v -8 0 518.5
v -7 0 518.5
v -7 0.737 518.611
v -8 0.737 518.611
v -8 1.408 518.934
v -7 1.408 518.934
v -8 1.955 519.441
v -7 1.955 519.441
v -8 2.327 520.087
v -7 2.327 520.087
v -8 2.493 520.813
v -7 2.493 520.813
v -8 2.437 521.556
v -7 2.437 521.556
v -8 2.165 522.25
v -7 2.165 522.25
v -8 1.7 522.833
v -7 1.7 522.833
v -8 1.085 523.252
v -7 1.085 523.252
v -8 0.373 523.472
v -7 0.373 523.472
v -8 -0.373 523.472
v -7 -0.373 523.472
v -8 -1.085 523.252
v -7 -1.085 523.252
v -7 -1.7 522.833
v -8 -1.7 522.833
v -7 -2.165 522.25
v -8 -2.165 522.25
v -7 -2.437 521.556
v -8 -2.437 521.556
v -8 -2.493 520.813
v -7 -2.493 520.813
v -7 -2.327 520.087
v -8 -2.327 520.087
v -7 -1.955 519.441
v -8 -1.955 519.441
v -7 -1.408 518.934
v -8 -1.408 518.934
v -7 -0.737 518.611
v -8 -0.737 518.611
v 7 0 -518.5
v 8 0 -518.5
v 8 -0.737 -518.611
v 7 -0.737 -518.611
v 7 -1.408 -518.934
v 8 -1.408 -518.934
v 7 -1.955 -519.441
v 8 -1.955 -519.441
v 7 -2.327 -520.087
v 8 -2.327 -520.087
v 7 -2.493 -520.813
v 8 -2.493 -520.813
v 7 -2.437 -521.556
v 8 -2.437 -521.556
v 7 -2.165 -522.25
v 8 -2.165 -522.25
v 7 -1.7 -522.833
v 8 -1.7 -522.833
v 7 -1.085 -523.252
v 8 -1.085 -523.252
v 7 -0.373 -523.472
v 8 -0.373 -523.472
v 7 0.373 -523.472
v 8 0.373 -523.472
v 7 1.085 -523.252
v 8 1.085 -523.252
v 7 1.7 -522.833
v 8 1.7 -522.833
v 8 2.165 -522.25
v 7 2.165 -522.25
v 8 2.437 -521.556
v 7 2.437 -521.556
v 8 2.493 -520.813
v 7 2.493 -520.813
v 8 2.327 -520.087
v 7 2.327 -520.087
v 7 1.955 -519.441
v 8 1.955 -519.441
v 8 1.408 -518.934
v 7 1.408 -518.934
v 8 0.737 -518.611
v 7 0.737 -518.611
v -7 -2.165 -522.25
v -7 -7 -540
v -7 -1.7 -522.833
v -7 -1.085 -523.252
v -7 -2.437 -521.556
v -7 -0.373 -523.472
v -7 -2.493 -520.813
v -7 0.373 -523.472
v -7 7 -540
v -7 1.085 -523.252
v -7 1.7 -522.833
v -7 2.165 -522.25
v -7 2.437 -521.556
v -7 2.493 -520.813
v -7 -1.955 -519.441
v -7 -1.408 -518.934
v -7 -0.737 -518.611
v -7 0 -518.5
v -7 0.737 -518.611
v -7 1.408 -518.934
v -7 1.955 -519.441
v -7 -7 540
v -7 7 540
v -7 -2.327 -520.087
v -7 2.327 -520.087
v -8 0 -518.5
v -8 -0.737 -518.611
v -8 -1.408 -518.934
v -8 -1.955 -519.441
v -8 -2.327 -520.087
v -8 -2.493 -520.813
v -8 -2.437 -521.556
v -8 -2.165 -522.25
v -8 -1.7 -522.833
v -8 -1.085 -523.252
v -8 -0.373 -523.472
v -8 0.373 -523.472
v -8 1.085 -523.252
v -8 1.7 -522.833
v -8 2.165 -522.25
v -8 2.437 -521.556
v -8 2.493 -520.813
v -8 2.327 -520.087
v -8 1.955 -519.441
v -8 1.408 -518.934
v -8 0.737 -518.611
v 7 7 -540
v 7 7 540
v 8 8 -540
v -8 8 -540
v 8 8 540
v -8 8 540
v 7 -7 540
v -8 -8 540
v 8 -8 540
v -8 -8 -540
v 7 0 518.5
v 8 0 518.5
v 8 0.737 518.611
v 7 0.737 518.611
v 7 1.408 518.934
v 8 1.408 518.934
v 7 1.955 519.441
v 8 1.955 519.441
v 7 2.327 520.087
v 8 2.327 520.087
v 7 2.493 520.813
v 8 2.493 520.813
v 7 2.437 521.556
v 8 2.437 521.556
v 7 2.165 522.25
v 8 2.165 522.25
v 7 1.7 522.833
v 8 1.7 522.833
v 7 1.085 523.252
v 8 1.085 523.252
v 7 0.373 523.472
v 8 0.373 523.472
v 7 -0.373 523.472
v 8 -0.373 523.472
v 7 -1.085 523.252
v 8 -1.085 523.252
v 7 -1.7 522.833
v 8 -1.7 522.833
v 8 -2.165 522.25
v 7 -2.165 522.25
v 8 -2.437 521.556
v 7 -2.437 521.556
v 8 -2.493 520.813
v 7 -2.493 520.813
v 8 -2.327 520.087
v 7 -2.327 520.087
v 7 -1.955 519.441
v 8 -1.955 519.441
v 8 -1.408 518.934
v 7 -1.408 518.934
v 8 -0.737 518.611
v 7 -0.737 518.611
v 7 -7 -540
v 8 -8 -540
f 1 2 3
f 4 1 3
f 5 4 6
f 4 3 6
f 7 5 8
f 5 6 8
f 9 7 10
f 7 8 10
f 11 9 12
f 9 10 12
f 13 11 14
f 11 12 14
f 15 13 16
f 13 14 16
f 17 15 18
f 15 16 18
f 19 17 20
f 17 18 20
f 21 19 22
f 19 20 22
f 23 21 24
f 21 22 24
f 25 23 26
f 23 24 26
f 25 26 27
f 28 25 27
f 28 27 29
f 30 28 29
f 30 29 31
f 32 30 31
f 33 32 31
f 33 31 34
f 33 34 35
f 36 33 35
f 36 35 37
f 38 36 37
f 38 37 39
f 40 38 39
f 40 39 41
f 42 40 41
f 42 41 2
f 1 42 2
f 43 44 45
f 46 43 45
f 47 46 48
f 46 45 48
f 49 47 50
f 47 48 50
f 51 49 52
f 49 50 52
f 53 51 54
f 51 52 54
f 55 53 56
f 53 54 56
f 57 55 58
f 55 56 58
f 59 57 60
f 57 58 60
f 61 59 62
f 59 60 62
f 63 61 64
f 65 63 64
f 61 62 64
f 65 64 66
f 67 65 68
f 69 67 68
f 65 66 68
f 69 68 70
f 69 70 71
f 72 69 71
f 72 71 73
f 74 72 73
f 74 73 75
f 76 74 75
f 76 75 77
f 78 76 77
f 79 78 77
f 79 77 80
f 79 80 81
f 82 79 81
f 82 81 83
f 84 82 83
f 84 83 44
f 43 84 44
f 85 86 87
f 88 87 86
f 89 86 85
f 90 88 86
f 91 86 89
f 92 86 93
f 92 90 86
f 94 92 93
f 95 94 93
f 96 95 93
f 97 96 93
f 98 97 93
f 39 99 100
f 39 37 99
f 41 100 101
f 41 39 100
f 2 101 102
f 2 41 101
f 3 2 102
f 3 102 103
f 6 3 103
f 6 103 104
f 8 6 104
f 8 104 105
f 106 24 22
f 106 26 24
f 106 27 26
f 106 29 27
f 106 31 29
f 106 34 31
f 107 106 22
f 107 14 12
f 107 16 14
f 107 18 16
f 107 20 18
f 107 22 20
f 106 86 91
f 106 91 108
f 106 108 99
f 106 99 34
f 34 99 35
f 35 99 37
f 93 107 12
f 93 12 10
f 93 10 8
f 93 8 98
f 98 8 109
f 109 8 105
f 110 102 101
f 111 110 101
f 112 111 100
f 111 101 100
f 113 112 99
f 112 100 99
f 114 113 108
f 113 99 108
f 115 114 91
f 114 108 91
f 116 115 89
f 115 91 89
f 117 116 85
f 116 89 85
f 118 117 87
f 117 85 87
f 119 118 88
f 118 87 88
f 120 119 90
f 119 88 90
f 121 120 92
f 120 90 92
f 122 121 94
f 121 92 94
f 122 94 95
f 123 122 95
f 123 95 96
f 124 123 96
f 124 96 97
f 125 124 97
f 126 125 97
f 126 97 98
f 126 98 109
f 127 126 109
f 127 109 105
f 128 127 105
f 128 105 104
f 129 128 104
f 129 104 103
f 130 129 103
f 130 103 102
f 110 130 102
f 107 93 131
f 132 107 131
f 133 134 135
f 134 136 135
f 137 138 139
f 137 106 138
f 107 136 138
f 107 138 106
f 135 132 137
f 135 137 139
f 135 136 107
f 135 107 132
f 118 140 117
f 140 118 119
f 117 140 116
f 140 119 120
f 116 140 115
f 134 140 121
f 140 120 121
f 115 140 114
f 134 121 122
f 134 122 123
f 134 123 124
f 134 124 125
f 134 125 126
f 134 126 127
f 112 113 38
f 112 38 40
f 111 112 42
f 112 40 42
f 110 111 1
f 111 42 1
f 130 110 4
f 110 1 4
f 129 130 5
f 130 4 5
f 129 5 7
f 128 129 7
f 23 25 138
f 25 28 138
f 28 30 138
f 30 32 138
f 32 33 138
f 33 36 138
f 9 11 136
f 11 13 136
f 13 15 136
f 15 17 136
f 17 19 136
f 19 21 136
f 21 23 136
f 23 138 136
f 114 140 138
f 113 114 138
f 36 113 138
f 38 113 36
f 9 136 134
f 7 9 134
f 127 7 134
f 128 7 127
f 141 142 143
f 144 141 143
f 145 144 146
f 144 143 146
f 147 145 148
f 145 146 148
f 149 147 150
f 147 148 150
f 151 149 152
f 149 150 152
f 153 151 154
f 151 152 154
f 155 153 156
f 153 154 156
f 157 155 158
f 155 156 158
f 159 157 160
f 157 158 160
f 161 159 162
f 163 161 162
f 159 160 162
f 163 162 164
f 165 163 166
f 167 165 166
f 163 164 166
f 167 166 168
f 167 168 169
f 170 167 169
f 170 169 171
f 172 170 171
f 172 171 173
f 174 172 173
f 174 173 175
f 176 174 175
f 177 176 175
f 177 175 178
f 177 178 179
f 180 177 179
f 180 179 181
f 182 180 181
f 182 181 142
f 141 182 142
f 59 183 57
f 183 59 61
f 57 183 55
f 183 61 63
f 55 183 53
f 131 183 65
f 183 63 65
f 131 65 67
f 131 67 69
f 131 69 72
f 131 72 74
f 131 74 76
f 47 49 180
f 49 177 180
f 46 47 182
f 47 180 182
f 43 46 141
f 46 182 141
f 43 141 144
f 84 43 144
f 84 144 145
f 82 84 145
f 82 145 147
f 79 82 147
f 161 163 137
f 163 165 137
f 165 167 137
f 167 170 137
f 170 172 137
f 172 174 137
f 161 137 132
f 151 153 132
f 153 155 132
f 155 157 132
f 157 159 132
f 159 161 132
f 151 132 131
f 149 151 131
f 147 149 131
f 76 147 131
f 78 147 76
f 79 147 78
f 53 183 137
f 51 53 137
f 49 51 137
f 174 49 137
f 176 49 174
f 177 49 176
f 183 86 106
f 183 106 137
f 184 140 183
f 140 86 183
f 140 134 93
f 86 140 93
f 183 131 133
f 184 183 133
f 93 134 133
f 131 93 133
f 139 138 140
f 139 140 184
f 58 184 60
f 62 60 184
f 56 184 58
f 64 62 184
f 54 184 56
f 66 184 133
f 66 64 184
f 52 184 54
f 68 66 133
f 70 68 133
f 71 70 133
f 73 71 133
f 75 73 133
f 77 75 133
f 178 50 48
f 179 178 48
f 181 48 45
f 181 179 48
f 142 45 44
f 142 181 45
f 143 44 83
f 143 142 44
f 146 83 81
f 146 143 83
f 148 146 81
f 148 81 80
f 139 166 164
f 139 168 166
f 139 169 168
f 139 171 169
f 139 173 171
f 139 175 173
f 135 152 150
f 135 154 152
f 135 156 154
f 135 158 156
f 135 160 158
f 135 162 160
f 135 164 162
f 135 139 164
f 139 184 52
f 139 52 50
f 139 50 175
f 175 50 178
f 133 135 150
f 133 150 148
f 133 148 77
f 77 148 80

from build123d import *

# Parameters (mm, degrees)
CROQUIS1_W            = 16
CROQUIS1_H            = 16
CROQUIS1_W_2          = 14
CROQUIS1_H_2          = 14
EXTRUIR_L_MINA1_DEPTH = 540
CROQUIS2_R            = 2.5
EXTRUIR1_DEPTH        = 541.296215052


with BuildPart() as part:
    # Croquis1 → Extruir-Lámina1 (new, symmetric)
    with BuildSketch(Plane.XY):
        Rectangle(CROQUIS1_W, CROQUIS1_H)
        Rectangle(CROQUIS1_W_2, CROQUIS1_H_2, mode=Mode.SUBTRACT)
    extrude(amount=EXTRUIR_L_MINA1_DEPTH, both=True)

    # Croquis2 → Extruir1 (cut, through all)
    with BuildSketch(Plane(origin=(8, 0, 0), x_dir=(0, 0, -1), z_dir=(1, 0, 0))):
        with Locations((-521, 0)):
            Circle(CROQUIS2_R)
        with Locations(Location((521, 0, 0), (0, 0, 180))):
            Circle(CROQUIS2_R)
    extrude(amount=-EXTRUIR1_DEPTH, mode=Mode.SUBTRACT)


solid = part.part
